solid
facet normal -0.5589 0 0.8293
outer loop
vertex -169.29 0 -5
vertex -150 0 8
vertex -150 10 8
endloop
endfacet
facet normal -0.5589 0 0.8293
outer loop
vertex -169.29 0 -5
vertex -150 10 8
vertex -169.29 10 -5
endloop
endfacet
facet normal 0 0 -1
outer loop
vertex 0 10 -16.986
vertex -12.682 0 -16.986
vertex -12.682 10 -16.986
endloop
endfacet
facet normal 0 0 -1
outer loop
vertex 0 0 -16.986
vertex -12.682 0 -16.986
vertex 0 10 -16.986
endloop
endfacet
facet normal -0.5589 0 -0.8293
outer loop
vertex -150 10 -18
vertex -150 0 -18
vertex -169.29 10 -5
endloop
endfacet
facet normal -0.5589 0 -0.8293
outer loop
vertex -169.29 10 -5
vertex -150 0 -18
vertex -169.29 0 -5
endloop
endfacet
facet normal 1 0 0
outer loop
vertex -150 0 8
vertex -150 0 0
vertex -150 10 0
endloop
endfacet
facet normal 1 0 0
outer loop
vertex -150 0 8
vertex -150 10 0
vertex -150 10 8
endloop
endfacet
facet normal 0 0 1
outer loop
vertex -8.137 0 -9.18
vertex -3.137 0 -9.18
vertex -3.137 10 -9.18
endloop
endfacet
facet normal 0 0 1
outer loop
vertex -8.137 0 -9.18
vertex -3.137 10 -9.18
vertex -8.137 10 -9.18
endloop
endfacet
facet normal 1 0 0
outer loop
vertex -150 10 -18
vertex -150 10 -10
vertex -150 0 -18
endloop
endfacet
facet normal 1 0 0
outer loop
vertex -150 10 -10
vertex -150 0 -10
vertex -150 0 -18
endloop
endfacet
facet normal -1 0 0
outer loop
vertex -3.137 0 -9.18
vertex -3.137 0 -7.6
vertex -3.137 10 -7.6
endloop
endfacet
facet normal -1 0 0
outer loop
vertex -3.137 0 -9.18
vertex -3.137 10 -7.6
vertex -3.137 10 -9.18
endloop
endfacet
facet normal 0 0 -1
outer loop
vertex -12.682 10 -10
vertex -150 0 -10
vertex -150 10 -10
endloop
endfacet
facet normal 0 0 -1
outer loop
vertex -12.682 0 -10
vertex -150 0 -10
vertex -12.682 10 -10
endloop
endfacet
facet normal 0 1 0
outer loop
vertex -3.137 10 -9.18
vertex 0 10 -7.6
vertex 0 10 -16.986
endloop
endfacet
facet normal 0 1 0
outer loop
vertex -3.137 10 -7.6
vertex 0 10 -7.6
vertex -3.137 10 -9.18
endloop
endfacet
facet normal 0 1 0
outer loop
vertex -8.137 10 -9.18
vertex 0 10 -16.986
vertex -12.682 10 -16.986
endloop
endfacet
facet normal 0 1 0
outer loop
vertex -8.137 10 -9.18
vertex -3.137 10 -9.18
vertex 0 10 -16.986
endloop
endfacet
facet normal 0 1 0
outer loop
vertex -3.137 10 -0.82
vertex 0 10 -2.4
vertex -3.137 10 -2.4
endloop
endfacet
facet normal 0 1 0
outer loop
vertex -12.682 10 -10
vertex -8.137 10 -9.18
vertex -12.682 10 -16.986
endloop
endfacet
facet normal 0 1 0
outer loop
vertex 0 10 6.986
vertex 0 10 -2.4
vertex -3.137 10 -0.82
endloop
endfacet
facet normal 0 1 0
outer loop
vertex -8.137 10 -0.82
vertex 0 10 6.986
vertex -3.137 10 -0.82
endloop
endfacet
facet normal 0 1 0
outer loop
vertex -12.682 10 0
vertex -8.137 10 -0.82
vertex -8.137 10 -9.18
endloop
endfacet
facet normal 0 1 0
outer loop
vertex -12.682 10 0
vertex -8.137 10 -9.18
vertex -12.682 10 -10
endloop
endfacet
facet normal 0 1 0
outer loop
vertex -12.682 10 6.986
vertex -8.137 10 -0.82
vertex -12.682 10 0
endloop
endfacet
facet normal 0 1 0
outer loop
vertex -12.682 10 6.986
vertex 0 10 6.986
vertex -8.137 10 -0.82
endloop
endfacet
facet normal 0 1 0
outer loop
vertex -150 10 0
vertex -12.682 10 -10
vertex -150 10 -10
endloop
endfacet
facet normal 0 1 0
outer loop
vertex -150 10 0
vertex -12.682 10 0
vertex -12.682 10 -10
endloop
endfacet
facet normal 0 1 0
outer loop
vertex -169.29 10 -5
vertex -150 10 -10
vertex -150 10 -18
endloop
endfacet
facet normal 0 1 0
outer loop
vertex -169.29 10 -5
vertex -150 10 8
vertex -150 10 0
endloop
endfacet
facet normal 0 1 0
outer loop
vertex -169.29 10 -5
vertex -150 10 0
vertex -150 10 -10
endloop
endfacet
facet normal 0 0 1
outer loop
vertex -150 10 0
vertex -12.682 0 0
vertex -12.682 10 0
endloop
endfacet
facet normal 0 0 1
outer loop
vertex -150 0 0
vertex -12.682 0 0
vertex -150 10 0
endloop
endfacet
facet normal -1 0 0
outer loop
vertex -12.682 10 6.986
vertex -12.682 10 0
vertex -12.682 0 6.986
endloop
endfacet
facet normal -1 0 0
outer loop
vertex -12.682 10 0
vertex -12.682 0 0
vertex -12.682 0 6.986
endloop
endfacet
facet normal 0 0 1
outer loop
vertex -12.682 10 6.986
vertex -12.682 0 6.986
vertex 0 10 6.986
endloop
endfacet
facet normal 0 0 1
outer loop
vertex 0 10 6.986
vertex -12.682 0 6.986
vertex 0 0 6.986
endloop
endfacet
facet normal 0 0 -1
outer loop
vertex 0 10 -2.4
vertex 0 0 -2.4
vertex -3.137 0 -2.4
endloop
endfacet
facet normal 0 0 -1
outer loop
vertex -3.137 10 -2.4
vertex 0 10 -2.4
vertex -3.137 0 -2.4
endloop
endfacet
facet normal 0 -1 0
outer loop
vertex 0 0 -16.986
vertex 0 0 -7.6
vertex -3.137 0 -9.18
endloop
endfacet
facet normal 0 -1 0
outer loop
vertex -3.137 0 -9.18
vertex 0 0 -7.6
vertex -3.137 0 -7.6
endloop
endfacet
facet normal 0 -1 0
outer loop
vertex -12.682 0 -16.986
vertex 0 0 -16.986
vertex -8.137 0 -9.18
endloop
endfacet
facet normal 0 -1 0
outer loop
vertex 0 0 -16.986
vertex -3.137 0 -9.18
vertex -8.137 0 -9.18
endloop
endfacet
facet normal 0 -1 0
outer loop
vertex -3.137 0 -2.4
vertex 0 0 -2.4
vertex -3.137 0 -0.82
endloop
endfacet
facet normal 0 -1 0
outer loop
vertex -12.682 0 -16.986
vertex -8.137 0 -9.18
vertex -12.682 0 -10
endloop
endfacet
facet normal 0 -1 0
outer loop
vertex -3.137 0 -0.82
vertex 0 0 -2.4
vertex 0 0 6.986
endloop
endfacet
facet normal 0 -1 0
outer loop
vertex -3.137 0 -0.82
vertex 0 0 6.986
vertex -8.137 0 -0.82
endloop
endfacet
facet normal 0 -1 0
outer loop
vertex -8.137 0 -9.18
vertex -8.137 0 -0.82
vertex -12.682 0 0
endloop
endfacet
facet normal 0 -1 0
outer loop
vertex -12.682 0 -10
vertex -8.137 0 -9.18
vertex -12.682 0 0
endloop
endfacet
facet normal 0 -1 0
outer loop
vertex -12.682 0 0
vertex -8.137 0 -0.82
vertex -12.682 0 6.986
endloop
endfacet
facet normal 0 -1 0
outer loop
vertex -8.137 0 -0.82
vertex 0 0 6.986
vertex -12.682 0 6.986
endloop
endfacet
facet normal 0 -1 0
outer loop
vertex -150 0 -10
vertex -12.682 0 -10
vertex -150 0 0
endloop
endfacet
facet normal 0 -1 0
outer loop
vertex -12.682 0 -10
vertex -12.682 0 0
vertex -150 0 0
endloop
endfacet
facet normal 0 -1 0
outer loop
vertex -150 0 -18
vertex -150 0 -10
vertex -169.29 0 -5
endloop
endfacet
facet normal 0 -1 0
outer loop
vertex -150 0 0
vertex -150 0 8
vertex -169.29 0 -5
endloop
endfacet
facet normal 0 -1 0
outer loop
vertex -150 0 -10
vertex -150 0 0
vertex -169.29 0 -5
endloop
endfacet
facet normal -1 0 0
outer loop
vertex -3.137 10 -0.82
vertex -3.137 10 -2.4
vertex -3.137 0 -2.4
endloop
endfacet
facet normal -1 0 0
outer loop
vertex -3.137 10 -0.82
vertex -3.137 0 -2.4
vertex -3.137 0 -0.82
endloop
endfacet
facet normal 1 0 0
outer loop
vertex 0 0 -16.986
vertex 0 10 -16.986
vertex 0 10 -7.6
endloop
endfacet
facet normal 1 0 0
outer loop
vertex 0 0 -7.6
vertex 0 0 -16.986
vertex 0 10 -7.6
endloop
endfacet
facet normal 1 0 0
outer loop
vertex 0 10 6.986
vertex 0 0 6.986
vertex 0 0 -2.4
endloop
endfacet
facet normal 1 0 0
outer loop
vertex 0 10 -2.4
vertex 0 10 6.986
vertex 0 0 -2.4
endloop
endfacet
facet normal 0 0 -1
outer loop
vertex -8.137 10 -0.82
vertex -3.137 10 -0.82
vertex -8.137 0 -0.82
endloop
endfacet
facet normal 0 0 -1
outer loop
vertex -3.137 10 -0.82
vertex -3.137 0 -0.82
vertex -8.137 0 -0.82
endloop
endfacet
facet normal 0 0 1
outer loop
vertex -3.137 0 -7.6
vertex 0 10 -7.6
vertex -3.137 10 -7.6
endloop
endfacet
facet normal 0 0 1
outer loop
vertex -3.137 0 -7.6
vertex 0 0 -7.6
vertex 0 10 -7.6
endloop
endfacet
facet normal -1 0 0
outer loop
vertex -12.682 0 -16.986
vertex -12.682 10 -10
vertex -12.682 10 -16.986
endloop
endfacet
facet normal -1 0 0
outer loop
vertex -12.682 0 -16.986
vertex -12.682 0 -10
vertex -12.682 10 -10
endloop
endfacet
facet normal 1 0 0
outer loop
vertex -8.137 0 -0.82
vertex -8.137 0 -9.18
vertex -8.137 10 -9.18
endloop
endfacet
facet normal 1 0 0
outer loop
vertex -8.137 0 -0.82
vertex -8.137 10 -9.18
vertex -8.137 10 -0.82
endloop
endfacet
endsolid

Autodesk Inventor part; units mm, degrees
ref_plane "YZ Plane" through (0, 0, 0) normal (1, 0, 0) x (0, 1, 0)
ref_plane "XZ Plane" through (0, 0, 0) normal (0, 1, 0) x (-1, 0, 0)
ref_plane "XY Plane" through (0, 0, 0) normal (0, 0, 1) x (1, 0, 0)
sketch "Sketch1" plane through (0, 0, 0) normal (0, 1, 0) x (-1, 0, 0)
  line L0 (0, 0) -> (150, 0)
  line L1 (150, 0) -> (150, -10)
  line L2 (150, -10) -> (0, -10)
  line L3 (0, -10) -> (0, 0)
  line L4 (144.6787, -5) -> (169.2898, -5)
  line L5 (150, 0) -> (150, 8)
  line L6 (150, 8) -> (169.2898, -5)
  line L7 (150, -10) -> (150, -18)
  line L8 (150, -18) -> (169.2898, -5)
  line L9 (0, -7.6) -> (3.1367, -7.6)
  line L10 (3.1367, -7.6) -> (3.1367, -9.1799)
  line L11 (3.1367, -9.1799) -> (8.1367, -9.1799)
  line L12 (8.1367, -9.1799) -> (8.1367, -5)
  line L13 (0, -2.4) -> (3.1367, -2.4)
  line L14 (3.1367, -2.4) -> (3.1367, -0.8201)
  line L15 (3.1367, -0.8201) -> (8.1367, -0.8201)
  line L16 (8.1367, -0.8201) -> (8.1367, -5)
  line L17 (12.6825, 0) -> (12.6825, 6.9857)
  line L18 (12.6825, 6.9857) -> (0, 6.9857)
  line L19 (0, 6.9857) -> (0, -2.4)
  line L20 (12.6825, -10) -> (12.6825, -16.9857)
  line L21 (12.6825, -16.9857) -> (0, -16.9857)
  line L22 (0, -16.9857) -> (0, -7.6)
  point P0 (0, -2.4)
  point P1 (1.5684, -7.6)
  point P2 (1.5684, -2.4)
  point P3 (3.1367, -1.61)
  dimension "d0" = 10
  dimension "d1" = 150
  dimension "d2" = 8
  dimension "d3" = 5
  dimension "d6" = 5.2
  dimension "d7" = 5
extrude "Extrusion1" add sketch "Sketch1" along normal blind 10 contours L19 L18 L17 L0 | L0 L1 L2 L3 L9 L10 L11 L12 L16 L15 L14 L13 | L5 L6 L4 L1 | L4 L8 L7 L1 | L2 L20 L21 L22
properties part number "Vector" material "Wood (Birch)"
